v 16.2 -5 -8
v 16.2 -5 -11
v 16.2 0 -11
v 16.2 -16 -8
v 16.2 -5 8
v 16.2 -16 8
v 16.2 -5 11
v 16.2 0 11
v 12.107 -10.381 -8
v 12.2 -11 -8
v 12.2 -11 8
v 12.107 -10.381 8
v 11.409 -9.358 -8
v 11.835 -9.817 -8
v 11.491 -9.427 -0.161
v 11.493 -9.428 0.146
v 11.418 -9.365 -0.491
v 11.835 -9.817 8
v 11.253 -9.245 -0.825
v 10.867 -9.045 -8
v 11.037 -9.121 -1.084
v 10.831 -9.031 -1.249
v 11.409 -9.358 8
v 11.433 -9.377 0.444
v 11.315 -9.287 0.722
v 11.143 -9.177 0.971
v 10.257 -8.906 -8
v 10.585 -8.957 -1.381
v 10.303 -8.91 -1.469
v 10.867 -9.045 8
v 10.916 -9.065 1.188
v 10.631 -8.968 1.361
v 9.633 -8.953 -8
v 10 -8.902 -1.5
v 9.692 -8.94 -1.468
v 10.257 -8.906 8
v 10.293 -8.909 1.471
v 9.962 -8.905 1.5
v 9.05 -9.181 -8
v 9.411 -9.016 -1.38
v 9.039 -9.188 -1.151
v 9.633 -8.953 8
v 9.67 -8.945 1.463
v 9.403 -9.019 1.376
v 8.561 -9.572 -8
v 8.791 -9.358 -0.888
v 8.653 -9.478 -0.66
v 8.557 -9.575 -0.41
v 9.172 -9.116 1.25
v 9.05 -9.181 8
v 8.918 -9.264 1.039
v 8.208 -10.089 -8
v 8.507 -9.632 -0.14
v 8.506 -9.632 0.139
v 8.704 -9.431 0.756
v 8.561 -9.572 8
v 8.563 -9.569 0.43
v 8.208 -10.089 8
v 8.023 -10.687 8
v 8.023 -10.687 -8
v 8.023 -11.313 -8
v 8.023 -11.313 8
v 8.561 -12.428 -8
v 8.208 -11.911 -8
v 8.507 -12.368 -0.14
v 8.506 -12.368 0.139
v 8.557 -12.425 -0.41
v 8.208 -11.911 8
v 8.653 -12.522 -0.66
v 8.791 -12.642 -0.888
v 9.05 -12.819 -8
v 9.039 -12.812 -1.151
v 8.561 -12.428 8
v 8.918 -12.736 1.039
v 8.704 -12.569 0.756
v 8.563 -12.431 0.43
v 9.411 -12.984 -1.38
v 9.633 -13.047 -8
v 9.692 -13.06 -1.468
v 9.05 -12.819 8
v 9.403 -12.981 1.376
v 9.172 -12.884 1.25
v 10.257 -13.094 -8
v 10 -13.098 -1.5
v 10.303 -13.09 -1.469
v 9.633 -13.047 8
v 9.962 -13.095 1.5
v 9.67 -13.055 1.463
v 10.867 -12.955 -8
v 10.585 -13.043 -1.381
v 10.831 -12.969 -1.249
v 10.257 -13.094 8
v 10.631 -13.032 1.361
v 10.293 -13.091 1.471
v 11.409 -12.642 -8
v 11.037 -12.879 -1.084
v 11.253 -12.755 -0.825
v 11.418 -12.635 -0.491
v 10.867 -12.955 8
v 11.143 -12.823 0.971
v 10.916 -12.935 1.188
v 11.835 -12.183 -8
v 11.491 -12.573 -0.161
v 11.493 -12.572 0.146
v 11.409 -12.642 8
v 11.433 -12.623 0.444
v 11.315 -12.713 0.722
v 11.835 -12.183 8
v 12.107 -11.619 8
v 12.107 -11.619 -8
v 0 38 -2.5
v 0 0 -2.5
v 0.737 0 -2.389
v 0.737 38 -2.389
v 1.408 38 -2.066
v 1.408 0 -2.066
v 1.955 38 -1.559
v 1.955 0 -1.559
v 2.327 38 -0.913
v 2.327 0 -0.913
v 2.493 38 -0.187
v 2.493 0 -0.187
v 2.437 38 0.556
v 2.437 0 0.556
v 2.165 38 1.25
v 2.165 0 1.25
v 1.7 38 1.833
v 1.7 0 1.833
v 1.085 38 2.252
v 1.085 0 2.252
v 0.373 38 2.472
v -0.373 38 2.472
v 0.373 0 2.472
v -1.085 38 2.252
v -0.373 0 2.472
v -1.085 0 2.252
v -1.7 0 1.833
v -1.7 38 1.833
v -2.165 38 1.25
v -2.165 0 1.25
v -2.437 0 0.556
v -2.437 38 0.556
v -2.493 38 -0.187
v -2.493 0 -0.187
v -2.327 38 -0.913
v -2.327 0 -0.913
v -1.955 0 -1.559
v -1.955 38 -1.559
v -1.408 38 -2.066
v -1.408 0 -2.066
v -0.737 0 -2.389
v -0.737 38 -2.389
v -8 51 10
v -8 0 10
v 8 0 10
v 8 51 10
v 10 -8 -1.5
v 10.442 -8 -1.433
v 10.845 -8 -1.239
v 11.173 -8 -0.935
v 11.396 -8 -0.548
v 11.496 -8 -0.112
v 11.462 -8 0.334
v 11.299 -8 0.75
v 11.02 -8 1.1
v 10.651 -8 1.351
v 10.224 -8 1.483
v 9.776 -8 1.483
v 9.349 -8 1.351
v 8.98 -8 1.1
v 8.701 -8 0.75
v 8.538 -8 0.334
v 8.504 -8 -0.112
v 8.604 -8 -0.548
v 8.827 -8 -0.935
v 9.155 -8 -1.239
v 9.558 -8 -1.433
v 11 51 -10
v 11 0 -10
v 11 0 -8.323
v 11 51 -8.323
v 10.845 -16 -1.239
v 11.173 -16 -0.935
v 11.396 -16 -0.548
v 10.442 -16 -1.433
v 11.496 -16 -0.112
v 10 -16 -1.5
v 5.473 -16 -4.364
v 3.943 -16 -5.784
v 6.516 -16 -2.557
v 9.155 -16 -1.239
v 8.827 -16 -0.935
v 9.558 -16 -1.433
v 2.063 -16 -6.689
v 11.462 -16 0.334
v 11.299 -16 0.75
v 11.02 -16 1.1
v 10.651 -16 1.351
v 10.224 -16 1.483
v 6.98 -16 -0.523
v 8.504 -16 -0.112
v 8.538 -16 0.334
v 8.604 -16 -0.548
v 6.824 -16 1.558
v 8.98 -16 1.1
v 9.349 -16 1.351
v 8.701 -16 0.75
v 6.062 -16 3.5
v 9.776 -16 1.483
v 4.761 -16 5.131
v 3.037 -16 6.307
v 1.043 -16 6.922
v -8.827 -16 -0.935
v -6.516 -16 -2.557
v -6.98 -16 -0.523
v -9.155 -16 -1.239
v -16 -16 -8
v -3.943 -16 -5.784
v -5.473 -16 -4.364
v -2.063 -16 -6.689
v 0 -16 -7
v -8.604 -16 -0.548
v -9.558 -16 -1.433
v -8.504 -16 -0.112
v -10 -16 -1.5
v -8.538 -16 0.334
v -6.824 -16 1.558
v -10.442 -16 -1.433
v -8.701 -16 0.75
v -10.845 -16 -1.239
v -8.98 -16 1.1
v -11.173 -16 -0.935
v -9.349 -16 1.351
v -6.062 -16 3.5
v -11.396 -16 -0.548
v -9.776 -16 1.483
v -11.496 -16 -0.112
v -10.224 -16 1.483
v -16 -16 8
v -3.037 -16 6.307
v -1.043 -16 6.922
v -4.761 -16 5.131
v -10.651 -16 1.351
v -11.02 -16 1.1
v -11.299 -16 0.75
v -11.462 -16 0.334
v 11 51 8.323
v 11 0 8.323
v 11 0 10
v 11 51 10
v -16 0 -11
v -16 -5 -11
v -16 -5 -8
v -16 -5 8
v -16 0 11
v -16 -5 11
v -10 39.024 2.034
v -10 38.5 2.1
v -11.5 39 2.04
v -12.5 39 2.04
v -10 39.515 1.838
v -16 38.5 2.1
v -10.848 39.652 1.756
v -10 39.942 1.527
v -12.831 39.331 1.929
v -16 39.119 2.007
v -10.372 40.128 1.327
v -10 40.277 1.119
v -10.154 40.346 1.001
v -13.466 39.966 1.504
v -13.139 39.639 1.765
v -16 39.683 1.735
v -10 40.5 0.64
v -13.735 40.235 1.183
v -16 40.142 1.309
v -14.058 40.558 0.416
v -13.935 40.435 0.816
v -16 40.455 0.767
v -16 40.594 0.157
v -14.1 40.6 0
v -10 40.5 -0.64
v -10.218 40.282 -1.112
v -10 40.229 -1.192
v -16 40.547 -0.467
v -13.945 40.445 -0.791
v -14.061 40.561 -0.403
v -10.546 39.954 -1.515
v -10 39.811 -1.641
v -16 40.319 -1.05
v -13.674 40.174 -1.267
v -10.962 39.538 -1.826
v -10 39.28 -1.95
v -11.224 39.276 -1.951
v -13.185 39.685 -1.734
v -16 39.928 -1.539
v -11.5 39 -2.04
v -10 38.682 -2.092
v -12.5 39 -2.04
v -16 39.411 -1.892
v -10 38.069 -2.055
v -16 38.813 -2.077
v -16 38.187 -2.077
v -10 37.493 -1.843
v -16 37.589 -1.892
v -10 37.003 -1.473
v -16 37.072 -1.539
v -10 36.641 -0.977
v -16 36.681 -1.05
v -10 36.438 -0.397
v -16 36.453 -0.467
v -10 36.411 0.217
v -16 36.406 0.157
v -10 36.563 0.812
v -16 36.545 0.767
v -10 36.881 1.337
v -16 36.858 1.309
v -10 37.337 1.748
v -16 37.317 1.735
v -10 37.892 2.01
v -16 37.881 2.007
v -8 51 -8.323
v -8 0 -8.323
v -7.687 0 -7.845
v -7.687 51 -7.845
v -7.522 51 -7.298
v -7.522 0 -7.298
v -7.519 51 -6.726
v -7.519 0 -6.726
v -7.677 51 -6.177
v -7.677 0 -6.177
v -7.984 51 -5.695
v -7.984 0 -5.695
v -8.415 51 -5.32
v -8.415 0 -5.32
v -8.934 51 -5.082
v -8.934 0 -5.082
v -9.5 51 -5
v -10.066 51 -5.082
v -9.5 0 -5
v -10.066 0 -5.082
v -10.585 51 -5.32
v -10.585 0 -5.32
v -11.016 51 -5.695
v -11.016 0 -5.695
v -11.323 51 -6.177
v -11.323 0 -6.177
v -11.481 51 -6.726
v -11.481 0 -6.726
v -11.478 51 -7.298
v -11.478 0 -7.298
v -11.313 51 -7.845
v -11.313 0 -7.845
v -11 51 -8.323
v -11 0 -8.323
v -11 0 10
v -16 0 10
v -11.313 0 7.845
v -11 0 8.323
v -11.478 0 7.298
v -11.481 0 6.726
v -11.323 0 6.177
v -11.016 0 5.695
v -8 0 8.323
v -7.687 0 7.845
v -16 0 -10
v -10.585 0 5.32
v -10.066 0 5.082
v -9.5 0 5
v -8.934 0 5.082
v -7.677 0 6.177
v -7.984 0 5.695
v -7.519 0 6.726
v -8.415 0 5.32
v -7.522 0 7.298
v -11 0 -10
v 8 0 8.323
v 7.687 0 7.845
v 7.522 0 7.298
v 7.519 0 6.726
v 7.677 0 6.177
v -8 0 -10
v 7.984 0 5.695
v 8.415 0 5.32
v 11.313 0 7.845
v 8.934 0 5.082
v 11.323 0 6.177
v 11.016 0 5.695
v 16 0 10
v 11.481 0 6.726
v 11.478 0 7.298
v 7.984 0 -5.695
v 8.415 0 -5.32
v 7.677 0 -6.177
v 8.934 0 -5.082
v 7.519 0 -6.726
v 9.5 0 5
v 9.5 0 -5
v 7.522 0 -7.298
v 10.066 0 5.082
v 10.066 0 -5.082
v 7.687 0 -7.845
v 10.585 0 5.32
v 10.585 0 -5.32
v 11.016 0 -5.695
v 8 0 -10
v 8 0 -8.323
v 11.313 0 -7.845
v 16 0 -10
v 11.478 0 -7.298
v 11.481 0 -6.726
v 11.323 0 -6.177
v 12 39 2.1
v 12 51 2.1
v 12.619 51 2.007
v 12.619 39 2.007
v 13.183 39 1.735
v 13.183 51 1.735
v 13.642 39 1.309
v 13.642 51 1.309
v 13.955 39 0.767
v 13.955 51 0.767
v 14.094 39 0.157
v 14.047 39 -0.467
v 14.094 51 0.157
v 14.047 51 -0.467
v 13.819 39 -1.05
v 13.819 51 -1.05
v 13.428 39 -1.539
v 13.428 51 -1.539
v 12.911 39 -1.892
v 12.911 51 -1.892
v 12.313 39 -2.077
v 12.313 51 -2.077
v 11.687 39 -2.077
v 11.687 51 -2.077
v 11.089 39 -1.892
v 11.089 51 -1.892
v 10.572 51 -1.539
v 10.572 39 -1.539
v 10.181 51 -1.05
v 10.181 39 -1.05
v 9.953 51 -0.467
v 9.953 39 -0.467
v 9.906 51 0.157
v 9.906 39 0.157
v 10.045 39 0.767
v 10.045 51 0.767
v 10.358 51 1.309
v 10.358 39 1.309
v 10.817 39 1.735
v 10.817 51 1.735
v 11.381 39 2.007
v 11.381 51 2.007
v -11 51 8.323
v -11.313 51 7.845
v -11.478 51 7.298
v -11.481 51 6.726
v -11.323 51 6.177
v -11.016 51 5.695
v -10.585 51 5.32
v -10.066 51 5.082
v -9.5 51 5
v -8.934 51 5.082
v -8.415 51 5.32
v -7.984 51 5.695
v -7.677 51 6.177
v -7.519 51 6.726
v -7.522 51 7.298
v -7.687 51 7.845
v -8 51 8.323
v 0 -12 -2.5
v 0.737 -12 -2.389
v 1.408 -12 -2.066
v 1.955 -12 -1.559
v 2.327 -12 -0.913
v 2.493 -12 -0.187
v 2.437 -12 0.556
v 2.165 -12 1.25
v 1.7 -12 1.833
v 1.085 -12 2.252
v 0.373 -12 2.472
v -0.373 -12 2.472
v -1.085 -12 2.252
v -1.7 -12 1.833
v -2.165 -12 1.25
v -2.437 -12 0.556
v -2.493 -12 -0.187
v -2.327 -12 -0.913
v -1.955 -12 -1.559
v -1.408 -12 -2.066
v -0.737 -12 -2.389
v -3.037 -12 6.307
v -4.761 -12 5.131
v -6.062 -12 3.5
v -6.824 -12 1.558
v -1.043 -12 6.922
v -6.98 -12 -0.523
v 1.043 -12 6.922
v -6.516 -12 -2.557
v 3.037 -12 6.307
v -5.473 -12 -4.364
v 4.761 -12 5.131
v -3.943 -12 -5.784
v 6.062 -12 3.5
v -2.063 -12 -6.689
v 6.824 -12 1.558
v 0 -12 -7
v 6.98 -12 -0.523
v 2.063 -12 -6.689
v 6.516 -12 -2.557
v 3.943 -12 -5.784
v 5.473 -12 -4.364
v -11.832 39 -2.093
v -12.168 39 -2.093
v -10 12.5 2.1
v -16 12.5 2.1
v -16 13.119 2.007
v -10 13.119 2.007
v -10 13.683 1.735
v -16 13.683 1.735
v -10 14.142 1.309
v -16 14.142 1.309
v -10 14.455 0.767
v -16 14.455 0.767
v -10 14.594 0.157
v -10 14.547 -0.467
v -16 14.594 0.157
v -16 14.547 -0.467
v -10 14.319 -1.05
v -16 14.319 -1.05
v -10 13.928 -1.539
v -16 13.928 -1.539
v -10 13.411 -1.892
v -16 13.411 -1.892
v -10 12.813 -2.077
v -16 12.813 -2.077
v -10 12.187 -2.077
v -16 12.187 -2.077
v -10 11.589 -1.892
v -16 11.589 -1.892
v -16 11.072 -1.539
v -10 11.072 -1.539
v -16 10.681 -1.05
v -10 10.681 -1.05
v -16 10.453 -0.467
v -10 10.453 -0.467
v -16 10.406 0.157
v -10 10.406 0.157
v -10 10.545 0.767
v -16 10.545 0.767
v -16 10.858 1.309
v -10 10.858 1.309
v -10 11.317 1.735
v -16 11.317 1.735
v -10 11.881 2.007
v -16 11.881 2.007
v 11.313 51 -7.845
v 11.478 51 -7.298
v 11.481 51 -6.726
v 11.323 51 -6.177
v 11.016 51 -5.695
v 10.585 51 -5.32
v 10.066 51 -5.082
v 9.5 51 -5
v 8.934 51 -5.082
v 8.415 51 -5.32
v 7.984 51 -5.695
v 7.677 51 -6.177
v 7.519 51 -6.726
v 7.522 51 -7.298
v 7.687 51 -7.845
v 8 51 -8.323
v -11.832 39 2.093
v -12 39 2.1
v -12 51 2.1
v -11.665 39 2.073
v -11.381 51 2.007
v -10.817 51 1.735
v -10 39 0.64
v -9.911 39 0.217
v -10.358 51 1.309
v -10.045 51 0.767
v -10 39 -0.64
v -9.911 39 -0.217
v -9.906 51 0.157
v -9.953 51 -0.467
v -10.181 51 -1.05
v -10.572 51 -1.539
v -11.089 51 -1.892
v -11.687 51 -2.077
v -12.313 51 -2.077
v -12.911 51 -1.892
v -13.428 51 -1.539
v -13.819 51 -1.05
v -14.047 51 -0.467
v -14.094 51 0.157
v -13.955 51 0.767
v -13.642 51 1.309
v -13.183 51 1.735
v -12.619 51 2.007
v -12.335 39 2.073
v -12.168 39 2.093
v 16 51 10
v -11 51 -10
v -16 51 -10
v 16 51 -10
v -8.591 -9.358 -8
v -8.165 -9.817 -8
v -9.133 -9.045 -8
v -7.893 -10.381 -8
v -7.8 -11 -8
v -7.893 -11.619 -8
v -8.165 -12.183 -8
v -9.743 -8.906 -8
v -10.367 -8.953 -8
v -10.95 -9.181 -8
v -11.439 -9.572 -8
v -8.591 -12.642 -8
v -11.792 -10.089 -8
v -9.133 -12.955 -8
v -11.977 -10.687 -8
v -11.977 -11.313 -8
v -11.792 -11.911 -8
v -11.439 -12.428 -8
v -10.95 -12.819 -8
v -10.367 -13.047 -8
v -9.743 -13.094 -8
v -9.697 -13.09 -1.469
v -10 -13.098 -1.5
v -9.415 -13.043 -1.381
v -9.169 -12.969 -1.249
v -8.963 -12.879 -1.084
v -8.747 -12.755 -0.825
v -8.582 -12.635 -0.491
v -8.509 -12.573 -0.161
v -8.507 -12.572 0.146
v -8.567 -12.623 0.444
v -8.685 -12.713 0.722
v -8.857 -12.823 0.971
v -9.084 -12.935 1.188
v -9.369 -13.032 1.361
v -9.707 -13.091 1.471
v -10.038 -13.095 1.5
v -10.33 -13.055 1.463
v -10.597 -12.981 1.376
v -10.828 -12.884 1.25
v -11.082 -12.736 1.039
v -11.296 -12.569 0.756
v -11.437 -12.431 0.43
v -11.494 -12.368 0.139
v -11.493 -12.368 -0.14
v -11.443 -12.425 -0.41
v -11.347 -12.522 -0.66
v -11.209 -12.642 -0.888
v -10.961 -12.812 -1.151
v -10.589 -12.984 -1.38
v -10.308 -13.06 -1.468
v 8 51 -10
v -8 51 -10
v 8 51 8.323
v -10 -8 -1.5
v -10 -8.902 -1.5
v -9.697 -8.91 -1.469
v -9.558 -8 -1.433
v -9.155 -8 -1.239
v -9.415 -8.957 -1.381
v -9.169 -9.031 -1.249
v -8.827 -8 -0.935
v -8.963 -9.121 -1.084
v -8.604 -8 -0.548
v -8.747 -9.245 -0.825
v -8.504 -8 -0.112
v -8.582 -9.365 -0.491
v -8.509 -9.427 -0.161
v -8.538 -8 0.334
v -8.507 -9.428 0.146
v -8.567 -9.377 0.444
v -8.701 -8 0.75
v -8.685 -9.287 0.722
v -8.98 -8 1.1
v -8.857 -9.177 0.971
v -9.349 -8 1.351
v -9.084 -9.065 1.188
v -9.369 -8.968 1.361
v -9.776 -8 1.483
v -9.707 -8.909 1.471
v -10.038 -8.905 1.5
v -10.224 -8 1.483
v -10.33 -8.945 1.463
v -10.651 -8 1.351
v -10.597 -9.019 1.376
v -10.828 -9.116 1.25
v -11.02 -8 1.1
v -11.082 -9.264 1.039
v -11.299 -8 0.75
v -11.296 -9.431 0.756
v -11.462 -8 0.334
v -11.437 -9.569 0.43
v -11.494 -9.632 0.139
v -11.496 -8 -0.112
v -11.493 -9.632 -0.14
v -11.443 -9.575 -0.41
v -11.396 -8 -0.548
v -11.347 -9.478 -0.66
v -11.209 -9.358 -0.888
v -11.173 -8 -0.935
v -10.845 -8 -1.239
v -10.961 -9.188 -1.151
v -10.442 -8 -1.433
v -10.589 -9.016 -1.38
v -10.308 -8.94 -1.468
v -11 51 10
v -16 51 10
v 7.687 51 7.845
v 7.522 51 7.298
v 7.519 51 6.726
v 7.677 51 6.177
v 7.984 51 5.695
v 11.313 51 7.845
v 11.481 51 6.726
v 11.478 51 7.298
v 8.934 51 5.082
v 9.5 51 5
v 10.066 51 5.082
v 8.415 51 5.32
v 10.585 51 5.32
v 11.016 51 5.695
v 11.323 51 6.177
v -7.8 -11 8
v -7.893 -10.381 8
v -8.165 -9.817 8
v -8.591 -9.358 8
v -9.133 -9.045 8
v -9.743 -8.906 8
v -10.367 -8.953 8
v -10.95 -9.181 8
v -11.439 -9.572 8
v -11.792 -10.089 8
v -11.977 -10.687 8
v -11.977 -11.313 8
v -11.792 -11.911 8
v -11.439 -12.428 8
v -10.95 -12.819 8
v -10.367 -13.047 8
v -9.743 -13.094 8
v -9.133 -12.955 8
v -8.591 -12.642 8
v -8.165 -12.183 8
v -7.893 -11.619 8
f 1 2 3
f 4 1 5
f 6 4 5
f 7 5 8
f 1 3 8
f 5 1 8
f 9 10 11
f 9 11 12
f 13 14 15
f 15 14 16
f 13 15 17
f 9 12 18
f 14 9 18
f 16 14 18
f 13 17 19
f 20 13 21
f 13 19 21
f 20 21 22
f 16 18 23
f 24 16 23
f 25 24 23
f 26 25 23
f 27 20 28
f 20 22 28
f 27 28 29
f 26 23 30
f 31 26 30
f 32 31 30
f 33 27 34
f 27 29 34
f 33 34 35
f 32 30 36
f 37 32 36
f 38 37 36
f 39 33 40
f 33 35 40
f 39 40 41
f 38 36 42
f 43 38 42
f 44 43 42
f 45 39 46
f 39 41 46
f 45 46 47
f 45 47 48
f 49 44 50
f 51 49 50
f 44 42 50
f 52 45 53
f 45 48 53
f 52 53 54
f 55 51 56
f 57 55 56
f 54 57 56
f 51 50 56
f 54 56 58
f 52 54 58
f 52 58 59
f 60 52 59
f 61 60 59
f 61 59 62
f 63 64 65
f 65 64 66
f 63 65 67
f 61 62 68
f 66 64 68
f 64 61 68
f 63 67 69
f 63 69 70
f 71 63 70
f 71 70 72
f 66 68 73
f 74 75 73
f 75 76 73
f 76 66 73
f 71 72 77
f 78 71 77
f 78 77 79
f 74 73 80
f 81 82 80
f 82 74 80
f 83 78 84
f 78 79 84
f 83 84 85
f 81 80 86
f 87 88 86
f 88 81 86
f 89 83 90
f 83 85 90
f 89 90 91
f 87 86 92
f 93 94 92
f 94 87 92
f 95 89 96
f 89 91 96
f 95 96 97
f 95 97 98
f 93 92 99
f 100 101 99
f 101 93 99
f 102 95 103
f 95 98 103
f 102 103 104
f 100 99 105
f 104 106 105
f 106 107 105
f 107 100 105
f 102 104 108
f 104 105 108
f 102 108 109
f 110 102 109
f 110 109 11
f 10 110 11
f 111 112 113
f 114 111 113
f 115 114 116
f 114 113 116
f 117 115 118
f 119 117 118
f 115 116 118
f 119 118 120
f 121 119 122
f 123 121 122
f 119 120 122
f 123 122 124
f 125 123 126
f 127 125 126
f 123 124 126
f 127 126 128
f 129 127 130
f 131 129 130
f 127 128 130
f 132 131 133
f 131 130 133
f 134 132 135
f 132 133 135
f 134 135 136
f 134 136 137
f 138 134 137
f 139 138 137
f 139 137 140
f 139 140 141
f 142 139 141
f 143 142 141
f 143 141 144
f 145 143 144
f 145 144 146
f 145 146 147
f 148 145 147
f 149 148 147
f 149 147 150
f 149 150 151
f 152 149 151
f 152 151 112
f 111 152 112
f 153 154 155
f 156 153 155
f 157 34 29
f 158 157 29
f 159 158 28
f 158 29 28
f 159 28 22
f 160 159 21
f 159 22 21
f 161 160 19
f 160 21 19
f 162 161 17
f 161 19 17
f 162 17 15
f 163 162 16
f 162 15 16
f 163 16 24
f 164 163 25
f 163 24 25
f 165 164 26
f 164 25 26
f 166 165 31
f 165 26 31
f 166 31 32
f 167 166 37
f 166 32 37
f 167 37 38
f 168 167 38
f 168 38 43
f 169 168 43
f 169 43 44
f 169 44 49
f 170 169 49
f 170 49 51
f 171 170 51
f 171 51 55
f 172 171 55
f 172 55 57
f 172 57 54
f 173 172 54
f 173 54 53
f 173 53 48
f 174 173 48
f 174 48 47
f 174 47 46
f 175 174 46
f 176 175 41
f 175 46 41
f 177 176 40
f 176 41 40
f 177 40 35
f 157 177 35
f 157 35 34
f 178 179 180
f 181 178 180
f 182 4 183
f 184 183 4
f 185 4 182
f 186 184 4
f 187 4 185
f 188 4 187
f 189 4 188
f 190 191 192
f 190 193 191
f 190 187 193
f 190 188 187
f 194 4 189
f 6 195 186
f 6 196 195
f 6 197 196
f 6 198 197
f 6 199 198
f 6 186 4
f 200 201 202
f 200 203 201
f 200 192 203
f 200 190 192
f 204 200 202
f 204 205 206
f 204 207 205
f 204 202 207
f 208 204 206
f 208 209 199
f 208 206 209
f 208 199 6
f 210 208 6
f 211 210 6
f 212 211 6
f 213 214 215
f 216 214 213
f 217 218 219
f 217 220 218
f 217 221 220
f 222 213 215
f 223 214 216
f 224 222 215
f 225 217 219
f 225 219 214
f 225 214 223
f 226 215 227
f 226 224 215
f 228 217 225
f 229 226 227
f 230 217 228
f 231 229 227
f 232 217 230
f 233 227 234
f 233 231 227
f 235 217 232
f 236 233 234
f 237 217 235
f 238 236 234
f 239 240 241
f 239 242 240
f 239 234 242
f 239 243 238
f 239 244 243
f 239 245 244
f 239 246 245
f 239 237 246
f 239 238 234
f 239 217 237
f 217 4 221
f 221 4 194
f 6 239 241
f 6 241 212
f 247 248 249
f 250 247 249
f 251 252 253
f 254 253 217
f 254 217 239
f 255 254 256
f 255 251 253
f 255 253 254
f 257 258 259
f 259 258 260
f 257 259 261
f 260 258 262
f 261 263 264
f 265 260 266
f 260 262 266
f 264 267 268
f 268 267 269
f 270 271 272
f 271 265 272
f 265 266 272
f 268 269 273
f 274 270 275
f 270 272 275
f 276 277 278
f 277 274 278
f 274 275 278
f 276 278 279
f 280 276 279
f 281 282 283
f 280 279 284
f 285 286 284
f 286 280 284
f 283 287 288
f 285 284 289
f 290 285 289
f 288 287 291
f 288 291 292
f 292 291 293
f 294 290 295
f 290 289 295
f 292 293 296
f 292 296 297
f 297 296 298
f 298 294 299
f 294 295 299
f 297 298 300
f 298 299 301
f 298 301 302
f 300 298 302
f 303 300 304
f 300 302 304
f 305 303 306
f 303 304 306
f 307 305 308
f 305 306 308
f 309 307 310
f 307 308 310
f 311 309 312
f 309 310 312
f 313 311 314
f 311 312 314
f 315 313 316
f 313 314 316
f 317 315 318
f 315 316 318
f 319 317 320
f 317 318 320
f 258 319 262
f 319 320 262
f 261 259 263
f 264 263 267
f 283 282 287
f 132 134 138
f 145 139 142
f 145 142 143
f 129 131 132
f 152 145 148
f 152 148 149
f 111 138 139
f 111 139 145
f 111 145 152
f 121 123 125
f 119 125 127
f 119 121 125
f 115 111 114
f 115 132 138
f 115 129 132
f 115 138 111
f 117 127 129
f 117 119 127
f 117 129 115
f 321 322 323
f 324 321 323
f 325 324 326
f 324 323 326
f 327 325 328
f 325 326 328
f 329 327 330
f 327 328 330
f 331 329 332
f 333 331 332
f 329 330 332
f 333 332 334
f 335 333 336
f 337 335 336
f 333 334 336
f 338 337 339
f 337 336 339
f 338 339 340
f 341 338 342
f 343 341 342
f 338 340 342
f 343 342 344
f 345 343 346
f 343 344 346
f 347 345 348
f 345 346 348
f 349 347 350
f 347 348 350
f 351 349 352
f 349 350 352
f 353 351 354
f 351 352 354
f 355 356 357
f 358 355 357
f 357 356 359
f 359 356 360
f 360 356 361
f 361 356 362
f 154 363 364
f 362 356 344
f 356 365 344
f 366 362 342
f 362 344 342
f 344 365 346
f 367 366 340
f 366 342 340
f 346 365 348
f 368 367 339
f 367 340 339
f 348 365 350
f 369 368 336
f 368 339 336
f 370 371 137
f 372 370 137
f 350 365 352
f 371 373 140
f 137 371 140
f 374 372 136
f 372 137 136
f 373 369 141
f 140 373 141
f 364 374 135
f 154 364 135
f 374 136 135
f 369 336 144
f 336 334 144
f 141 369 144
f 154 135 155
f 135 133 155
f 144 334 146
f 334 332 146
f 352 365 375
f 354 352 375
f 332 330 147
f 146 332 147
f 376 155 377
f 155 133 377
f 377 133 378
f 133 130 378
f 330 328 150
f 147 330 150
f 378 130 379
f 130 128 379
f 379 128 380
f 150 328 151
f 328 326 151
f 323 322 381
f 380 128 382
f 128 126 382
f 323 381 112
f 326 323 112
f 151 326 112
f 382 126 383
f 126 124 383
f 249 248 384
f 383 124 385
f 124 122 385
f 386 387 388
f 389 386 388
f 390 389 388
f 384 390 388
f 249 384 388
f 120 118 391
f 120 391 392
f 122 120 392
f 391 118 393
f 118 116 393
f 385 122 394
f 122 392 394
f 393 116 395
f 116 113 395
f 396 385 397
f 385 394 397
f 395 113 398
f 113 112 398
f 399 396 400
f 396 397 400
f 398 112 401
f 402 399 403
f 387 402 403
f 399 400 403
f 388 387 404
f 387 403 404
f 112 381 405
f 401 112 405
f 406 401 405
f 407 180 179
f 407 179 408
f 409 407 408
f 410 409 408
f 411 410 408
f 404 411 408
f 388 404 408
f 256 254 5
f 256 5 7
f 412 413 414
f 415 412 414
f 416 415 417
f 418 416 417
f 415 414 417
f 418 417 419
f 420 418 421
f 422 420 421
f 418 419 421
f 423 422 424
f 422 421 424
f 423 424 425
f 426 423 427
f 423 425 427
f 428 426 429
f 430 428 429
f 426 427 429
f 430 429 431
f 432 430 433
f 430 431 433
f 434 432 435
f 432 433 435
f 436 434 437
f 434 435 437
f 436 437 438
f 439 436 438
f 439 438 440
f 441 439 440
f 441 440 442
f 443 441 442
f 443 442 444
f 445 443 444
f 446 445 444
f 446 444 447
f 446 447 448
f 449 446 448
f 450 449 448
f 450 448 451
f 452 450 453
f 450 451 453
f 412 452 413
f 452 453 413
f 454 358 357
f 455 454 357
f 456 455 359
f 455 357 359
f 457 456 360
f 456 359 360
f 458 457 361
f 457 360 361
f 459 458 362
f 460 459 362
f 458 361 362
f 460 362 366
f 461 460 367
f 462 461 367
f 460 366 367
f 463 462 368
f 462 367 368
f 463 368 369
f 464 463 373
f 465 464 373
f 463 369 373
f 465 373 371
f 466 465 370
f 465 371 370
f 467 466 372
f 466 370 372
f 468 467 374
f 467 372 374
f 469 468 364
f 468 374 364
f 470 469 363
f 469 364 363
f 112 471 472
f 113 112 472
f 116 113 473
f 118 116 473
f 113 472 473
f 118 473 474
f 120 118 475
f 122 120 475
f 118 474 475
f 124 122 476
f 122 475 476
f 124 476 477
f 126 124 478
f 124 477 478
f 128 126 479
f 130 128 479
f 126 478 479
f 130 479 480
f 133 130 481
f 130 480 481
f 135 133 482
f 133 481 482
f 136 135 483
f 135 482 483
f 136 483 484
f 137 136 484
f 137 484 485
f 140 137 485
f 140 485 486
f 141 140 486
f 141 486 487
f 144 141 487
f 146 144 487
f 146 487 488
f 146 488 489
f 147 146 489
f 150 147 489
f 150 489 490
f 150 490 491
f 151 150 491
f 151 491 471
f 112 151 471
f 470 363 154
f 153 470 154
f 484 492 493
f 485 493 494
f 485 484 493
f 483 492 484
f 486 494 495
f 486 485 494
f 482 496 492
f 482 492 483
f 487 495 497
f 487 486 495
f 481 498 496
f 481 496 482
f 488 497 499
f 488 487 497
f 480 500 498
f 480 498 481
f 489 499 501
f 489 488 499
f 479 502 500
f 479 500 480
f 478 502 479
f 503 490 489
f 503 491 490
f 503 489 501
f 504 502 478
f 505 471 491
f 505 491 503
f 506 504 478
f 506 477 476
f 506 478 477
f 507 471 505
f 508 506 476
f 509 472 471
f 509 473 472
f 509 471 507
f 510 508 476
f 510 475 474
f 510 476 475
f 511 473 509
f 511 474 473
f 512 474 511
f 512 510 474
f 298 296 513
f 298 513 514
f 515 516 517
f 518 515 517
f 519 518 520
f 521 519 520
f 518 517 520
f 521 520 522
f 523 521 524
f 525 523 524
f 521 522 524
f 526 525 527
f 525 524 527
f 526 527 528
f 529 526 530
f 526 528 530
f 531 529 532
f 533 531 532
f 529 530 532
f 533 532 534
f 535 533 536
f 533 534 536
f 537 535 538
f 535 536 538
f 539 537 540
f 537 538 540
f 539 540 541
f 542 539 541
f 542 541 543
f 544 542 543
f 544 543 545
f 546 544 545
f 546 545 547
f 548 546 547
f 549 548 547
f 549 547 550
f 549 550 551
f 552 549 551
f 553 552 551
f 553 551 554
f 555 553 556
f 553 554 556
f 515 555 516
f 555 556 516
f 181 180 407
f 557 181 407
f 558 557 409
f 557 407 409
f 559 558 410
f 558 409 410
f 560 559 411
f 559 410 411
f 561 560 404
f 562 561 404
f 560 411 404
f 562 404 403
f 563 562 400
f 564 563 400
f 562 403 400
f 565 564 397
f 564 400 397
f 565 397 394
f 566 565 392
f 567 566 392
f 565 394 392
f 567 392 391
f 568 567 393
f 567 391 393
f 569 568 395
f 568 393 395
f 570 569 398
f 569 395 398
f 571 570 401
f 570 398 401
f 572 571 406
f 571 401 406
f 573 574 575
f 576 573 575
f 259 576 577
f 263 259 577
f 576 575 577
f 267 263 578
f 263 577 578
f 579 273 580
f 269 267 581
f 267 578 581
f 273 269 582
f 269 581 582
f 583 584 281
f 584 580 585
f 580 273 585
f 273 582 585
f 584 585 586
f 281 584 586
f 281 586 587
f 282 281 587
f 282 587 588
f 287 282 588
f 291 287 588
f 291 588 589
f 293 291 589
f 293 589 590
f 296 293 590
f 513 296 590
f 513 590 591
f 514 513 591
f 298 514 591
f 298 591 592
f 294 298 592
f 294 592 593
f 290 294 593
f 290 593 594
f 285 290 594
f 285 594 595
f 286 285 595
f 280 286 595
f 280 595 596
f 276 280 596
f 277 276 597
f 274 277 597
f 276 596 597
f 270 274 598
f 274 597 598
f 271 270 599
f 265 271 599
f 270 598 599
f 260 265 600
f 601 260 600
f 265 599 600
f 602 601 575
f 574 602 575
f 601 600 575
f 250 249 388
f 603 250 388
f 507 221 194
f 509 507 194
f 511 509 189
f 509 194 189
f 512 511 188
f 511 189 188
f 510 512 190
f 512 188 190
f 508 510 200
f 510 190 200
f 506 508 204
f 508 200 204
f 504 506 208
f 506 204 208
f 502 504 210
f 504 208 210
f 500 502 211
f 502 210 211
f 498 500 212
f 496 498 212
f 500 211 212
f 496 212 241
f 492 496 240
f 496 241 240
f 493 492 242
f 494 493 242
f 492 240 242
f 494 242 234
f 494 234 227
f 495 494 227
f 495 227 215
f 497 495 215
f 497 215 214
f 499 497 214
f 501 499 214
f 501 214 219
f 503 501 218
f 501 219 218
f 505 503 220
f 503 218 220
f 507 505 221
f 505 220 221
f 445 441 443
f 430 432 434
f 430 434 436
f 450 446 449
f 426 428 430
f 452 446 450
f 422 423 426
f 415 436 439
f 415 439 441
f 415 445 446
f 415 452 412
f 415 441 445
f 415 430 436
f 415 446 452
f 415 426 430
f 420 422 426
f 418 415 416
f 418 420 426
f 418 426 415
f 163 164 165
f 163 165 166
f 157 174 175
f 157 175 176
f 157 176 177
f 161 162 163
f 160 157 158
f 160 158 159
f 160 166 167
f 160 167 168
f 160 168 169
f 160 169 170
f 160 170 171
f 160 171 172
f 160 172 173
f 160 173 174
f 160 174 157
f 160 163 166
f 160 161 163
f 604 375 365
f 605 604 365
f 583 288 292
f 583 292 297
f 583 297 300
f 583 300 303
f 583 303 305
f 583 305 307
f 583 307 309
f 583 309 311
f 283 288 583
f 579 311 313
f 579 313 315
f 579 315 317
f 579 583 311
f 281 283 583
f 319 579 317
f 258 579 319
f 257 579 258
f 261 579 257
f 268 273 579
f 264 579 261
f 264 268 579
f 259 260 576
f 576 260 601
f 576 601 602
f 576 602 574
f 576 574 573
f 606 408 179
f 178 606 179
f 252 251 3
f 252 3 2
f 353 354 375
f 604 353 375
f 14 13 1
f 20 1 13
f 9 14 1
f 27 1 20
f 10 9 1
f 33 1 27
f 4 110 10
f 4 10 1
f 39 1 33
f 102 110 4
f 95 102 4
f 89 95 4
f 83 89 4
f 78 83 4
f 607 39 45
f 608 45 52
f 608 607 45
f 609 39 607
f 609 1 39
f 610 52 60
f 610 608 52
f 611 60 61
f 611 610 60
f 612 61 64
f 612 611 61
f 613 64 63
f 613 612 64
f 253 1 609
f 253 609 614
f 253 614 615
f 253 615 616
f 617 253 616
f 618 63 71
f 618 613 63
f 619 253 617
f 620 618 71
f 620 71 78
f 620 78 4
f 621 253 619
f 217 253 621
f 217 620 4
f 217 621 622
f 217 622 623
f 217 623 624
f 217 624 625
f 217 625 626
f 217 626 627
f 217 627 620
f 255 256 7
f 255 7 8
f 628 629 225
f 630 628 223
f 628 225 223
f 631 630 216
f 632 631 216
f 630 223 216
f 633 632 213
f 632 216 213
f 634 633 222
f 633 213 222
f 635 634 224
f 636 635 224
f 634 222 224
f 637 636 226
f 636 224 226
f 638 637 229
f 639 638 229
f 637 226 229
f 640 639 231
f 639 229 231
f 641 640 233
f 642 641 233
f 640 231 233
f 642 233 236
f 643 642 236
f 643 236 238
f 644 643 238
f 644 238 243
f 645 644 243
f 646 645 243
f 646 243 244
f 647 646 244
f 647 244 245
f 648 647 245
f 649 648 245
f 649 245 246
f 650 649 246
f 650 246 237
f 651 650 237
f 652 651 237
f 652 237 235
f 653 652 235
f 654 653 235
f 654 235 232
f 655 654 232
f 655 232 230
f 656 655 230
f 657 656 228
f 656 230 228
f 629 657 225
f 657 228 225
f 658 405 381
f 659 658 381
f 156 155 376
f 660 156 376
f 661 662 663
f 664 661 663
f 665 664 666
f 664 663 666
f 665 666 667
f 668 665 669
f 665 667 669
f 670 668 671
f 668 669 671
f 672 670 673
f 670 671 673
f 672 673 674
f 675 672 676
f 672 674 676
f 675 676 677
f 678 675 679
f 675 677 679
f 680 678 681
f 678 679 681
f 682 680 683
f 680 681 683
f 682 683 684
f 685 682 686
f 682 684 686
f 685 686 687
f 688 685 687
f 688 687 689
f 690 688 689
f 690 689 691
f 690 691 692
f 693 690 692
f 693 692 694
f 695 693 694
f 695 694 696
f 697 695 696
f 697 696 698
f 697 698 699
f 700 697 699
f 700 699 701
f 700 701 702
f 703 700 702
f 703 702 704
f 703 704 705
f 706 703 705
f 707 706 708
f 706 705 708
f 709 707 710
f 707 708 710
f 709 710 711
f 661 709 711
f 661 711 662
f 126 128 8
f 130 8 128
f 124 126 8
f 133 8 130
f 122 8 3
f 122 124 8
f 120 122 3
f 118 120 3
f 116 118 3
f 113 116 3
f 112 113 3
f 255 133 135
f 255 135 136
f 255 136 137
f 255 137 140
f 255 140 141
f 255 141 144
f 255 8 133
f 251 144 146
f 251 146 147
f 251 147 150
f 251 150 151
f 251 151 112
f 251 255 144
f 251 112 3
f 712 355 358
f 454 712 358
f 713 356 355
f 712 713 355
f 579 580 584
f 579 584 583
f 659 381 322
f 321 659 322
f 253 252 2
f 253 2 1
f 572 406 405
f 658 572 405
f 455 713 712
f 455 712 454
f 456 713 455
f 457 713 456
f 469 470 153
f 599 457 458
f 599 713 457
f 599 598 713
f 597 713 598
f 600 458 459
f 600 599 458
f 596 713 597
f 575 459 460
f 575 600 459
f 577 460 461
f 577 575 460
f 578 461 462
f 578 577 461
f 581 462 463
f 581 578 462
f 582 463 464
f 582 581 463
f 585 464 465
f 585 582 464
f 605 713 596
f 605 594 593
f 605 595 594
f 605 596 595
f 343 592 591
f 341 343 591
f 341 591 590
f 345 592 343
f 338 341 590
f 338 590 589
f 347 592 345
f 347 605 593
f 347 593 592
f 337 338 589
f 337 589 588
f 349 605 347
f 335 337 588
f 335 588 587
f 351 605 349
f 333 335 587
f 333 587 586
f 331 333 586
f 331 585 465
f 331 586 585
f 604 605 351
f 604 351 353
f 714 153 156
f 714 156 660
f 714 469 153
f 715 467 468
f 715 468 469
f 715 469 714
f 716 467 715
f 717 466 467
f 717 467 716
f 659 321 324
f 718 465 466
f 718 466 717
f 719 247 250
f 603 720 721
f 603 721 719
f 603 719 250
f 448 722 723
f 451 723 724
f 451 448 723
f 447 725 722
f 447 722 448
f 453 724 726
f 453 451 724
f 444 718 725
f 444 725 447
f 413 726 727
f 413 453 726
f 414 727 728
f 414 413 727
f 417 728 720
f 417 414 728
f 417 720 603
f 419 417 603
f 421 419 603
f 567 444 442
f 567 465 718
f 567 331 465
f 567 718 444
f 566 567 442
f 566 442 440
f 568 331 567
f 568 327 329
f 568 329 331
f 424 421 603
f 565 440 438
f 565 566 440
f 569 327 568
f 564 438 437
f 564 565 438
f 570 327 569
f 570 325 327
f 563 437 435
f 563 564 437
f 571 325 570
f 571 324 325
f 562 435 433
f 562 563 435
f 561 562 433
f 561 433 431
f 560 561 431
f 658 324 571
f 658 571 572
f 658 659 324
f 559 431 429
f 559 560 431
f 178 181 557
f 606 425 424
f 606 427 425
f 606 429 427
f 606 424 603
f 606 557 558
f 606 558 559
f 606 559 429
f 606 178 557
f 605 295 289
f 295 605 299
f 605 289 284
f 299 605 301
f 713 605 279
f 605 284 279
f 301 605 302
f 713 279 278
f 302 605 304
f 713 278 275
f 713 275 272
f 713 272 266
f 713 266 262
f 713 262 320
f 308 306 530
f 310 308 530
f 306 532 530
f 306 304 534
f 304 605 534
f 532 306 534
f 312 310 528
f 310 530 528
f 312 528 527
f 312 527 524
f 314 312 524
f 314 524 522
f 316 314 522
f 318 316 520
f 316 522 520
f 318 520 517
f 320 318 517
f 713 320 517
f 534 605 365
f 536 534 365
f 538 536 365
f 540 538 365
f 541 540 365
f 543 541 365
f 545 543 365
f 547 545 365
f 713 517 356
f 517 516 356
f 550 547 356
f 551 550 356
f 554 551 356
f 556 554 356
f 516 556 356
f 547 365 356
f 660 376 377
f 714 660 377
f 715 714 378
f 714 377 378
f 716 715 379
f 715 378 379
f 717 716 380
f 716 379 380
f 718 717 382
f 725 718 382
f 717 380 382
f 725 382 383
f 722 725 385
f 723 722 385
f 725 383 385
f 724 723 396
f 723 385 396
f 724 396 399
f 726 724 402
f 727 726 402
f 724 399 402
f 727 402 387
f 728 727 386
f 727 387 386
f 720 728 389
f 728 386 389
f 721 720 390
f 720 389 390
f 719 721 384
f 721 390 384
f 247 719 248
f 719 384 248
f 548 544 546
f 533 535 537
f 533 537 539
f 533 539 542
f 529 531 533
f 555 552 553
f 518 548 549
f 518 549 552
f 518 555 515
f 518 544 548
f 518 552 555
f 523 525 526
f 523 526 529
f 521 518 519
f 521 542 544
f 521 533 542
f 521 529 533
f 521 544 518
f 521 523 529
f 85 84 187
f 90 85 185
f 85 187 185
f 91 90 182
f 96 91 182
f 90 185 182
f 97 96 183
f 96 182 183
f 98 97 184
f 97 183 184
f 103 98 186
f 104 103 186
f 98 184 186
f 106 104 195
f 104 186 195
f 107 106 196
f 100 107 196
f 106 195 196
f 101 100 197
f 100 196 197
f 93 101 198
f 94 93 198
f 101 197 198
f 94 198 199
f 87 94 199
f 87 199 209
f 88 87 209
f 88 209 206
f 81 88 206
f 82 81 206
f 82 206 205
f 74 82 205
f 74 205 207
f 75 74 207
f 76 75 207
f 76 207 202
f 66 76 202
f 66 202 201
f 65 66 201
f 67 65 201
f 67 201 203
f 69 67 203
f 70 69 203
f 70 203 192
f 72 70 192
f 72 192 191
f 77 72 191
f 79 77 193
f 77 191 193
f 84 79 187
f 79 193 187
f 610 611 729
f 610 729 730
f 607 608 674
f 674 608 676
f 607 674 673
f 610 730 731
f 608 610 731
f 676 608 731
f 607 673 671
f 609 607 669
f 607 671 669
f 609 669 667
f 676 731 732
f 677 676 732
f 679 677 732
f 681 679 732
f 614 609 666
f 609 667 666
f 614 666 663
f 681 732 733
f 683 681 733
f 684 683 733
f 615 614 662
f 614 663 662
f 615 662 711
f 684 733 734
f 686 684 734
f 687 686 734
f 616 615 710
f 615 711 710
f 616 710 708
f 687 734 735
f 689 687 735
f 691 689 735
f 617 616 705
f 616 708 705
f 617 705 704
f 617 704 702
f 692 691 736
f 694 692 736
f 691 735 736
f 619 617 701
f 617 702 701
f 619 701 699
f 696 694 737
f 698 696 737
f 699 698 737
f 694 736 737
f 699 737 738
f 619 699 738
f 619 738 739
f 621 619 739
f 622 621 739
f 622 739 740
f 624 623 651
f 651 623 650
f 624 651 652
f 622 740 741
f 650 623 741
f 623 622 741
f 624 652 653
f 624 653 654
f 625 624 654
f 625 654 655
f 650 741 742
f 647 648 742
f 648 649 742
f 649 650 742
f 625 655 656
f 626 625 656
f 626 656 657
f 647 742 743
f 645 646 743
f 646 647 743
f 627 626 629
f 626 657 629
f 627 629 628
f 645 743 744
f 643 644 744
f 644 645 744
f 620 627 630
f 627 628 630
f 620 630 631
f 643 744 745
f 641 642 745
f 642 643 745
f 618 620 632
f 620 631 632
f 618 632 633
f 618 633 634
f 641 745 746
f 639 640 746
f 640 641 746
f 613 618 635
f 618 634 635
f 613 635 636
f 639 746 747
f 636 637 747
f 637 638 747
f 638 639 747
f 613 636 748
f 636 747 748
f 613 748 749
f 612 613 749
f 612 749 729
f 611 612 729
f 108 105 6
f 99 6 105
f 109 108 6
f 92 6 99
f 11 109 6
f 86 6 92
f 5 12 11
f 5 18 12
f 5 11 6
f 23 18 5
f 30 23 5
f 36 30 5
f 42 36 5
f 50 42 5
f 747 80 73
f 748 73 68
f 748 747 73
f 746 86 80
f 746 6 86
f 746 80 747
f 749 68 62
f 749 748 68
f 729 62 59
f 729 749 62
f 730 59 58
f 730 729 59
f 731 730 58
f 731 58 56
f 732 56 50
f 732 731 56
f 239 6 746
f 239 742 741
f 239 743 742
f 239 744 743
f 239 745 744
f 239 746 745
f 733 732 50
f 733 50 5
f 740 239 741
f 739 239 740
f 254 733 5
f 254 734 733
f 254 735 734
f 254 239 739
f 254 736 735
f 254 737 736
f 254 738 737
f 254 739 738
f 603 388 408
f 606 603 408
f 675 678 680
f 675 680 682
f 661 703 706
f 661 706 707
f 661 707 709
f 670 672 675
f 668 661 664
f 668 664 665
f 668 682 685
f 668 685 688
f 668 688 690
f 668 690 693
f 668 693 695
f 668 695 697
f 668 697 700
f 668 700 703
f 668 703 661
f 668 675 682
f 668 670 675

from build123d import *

# Parameters (mm, degrees)
EXTRUDE_1_DEPTH     = 51
EXTRUDE_2_DEPTH     = 32.2
SKETCH_5_R          = 7
CUT_EXTRUDE_3_DEPTH = 4
SKETCH_7_R          = 1.5
CUT_EXTRUDE_4_DEPTH = 8
SKETCH_8_R          = 2.5
CUT_EXTRUDE_5_DEPTH = 50
SKETCH_9_R          = 2.1
CUT_EXTRUDE_6_DEPTH = 57.784152719
SKETCH_10_R         = 2.1
CUT_EXTRUDE_7_DEPTH = 12
SKETCH_11_R         = 2.1
CUT_EXTRUDE_8_DEPTH = 6


with BuildPart() as part:
    # 草图1 → 拉伸1 (new body)
    with BuildSketch(Plane(origin=(0, 0, 0), x_dir=(1, 0, 0), z_dir=(0, 1, 0))):
        with BuildLine():
            Line((-16, -10), (-11, -10))
            Line((-11, -10), (-11, -8.322875656))
            ThreePointArc((-11, -8.322875656), (-9.5, -5), (-8, -8.322875656))
            Line((-8, -8.322875656), (-8, -10))
            Line((-8, -10), (8, -10))
            Line((8, -10), (8, -8.322875656))
            ThreePointArc((8, -8.322875656), (9.5, -5), (11, -8.322875656))
            Line((11, -8.322875656), (11, -10))
            Line((11, -10), (16, -10))
            Line((16, -10), (16, 10))
            Line((16, 10), (11, 10))
            Line((11, 10), (11, 8.322875656))
            ThreePointArc((11, 8.322875656), (9.5, 5), (8, 8.322875656))
            Line((8, 8.322875656), (8, 10))
            Line((8, 10), (-8, 10))
            Line((-8, 10), (-8, 8.322875656))
            ThreePointArc((-8, 8.322875656), (-9.5, 5), (-11, 8.322875656))
            Line((-11, 8.322875656), (-11, 10))
            Line((-11, 10), (-16, 10))
            Line((-16, 10), (-16, -10))
        make_face()
    extrude(amount=EXTRUDE_1_DEPTH)


with BuildPart() as body_2:
    # 草图4 → 拉伸2 (new body)
    with BuildSketch(Plane.ZY.offset(16)):
        Polygon((-11, 0), (-11, -5), (-8, -5), (-8, -16), (8, -16), (8, -5), (11, -5), (11, 0), align=None)
    extrude(amount=-EXTRUDE_2_DEPTH)

    # 草图5 → 拉伸3 (cut)
    with BuildSketch(Plane.XZ.offset(16)):
        with Locations(Location((0, 0, 0), (0, 0, 270))):
            Circle(SKETCH_5_R)
    extrude(amount=-CUT_EXTRUDE_3_DEPTH, mode=Mode.SUBTRACT)

    # 草图7 → 拉伸4 (cut)
    with BuildSketch(Plane.XZ.offset(16)):
        with Locations(Location((-10, 0, 0), (0, 0, 270))):
            Circle(SKETCH_7_R)
        with Locations(Location((10, 0, 0), (0, 0, 270))):
            Circle(SKETCH_7_R)
    extrude(amount=-CUT_EXTRUDE_4_DEPTH, mode=Mode.SUBTRACT)


with BuildPart() as cut_extrude_5_tool:
    # 草图8 → 拉伸5 (new body)
    with BuildSketch(Plane.XZ.offset(12)):
        with Locations(Location((0, 0, 0), (0, 0, 270))):
            Circle(SKETCH_8_R)
    extrude(amount=-CUT_EXTRUDE_5_DEPTH)


with BuildPart() as part_1:
    add(part.part)

    # 拉伸5: cut by cut_extrude_5_tool
    add(cut_extrude_5_tool.part, mode=Mode.SUBTRACT)

    # 草图10 → 拉伸7 (cut)
    with BuildSketch(Plane(origin=(0, 51, 0), x_dir=(1, 0, 0), z_dir=(0, 1, 0))):
        with Locations(Location((12, 0, 0), (0, 0, 270))):
            Circle(SKETCH_10_R)
        with Locations(Location((-12, 0, 0), (0, 0, 270))):
            Circle(SKETCH_10_R)
    extrude(amount=-CUT_EXTRUDE_7_DEPTH, mode=Mode.SUBTRACT)

    # 草图11 → 拉伸8 (cut)
    with BuildSketch(Plane.ZY.offset(16)):
        with Locations((0, 38.5)):
            Circle(SKETCH_11_R)
        with Locations((0, 12.5)):
            Circle(SKETCH_11_R)
    extrude(amount=-CUT_EXTRUDE_8_DEPTH, mode=Mode.SUBTRACT)


with BuildPart() as body_2_1:
    add(body_2.part)

    # 拉伸5: cut by cut_extrude_5_tool
    add(cut_extrude_5_tool.part, mode=Mode.SUBTRACT)

    # 草图9 → 拉伸6 (cut, through all)
    with BuildSketch(Plane.XY.offset(8)):
        with Locations((10.1, -11)):
            Circle(SKETCH_9_R)
        with Locations((-9.9, -11)):
            Circle(SKETCH_9_R)
    extrude(amount=-CUT_EXTRUDE_6_DEPTH, mode=Mode.SUBTRACT)


solid = Compound([part_1.part, body_2_1.part])
